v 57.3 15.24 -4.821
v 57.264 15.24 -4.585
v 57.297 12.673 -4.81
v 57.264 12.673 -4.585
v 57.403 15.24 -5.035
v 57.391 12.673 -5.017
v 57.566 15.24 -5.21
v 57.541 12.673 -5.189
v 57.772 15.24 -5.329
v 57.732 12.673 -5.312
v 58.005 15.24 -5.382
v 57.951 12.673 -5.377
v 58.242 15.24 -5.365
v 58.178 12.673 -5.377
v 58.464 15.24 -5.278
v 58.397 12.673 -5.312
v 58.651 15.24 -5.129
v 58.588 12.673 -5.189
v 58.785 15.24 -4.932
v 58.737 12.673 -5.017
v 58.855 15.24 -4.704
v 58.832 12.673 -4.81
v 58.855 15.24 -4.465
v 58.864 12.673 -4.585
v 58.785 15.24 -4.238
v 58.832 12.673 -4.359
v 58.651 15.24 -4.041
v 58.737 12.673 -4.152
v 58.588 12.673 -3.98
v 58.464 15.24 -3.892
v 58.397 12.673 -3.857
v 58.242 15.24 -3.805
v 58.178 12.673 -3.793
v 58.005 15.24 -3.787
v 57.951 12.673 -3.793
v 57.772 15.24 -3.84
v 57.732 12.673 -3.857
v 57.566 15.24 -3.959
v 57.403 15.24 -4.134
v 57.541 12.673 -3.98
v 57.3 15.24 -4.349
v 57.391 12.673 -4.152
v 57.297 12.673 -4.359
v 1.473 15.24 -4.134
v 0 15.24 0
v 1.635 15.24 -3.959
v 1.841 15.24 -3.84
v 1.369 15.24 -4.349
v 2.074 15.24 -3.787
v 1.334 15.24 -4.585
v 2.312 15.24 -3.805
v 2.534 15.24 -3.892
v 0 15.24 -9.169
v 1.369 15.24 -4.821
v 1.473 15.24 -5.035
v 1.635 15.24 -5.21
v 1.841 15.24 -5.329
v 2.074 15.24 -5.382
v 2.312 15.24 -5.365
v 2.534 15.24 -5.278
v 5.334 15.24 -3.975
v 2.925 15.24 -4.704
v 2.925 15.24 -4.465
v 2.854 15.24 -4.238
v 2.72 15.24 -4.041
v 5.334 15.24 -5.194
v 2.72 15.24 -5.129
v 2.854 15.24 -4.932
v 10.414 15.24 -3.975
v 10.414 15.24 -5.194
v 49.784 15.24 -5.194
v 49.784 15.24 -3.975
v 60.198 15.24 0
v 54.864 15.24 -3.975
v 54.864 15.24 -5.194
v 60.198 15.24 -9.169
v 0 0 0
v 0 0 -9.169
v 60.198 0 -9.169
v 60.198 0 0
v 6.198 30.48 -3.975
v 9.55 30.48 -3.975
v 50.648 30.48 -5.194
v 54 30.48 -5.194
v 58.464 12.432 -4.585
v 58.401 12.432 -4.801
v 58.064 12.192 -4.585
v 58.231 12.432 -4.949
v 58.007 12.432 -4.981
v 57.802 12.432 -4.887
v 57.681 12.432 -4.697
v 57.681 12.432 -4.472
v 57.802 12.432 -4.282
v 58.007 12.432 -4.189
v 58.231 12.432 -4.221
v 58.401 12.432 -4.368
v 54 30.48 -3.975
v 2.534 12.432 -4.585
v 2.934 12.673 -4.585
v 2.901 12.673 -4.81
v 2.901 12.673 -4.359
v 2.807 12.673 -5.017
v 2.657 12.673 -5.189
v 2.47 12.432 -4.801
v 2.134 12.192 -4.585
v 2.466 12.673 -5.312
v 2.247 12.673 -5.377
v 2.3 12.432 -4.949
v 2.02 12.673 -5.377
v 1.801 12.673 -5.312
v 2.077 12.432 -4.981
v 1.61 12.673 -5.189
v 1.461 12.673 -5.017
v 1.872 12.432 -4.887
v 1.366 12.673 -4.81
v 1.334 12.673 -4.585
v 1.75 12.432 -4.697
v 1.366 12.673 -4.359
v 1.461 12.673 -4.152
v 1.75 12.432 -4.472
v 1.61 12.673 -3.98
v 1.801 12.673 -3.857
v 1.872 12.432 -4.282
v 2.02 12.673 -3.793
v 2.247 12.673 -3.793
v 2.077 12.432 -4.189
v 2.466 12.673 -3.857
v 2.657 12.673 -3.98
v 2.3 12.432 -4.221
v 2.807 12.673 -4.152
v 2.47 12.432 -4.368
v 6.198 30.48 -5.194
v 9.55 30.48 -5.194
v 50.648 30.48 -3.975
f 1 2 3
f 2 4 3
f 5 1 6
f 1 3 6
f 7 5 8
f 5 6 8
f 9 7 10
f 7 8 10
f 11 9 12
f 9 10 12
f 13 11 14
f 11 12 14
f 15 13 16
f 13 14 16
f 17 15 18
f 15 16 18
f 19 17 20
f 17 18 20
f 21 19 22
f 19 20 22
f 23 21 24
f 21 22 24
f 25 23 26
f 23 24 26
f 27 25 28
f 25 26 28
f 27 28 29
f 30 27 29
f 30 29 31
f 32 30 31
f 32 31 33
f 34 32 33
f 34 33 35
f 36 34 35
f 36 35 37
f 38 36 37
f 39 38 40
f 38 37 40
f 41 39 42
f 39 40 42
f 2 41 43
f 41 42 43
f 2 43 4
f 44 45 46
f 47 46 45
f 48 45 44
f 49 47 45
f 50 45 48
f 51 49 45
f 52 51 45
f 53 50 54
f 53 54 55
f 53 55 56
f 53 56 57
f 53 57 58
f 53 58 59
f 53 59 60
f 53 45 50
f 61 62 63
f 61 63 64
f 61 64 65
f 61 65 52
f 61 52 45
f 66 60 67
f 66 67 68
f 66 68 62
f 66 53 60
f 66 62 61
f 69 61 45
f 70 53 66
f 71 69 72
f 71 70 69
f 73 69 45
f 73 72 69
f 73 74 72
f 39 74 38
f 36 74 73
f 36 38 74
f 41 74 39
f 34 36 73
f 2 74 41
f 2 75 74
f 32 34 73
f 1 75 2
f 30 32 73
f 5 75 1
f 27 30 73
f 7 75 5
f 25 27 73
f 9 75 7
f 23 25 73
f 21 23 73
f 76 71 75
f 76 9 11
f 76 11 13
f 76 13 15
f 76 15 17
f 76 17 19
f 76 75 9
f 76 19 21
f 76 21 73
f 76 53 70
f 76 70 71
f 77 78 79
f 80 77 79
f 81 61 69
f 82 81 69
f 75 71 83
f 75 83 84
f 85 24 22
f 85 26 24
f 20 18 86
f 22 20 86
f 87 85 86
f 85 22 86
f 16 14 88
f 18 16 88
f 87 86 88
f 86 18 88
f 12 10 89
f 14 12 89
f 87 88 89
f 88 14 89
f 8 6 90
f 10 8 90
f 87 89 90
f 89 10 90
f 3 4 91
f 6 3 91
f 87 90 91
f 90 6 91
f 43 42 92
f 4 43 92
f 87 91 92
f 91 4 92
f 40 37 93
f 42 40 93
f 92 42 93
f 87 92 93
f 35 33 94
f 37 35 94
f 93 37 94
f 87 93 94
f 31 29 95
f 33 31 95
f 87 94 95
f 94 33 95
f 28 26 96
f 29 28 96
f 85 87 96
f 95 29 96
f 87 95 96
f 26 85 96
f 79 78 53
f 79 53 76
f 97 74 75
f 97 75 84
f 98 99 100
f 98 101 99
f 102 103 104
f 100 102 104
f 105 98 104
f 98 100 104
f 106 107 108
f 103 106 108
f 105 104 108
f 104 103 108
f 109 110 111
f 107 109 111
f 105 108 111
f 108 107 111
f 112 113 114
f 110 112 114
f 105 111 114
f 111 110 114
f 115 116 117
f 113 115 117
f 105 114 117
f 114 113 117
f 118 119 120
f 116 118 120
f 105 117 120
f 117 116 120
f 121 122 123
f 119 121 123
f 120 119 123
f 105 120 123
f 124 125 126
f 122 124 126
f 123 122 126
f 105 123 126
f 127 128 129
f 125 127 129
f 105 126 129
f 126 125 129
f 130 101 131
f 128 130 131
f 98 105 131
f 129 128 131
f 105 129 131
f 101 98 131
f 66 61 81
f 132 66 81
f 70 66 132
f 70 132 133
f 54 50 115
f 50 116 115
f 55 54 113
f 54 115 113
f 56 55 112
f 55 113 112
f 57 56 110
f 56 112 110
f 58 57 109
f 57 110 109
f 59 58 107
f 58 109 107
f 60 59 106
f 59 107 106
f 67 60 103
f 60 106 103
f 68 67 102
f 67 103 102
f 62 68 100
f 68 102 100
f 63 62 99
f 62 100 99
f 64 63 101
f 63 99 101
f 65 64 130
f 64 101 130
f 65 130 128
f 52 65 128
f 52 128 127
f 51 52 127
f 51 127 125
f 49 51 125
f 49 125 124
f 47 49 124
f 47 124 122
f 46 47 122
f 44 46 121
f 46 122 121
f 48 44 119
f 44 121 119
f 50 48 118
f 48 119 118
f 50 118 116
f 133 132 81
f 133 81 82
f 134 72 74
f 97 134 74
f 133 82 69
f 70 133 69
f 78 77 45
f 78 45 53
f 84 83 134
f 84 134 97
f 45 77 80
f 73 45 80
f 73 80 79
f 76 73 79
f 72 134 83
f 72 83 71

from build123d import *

# Parameters (mm, degrees)
SKETCH1_W                 = 60.198
SKETCH1_H                 = 9.1694
BOSS_EXTRUDE1_DEPTH       = 15.24
SKETCH2_W                 = 5.08
SKETCH2_H                 = 1.2192
BOSS_EXTRUDE2_DEPTH       = 15.24
CUT_EXTRUDE1_REACH        = 69.674
M2X0_4_TAPPED_HOLE1_D     = 1.6
M2X0_4_TAPPED_HOLE1_DEPTH = 2.567311505
M2X0_4_TAPPED_HOLE1_TIP   = 0.480688495


with BuildPart() as part:
    # Sketch1 → Boss-Extrude1 (new body)
    with BuildSketch(Plane(origin=(0, 0, 0), x_dir=(1, 0, 0), z_dir=(0, 1, 0))):
        with Locations((30.099, 4.5847)):
            Rectangle(SKETCH1_W, SKETCH1_H)
    extrude(amount=BOSS_EXTRUDE1_DEPTH)

    # Sketch2 → Boss-Extrude2 (add)
    with BuildSketch(Plane(origin=(0, 15.24, 0), x_dir=(1, 0, 0), z_dir=(0, 1, 0))):
        with Locations((7.874, 4.5847)):
            Rectangle(SKETCH2_W, SKETCH2_H)
        with Locations((52.324, 4.5847)):
            Rectangle(SKETCH2_W, SKETCH2_H)
    extrude(amount=BOSS_EXTRUDE2_DEPTH)

    # Sketch3 → Cut-Extrude1 (cut, up to next)
    with BuildSketch(Plane.XY.offset(-3.9751), mode=Mode.PRIVATE) as cut_extrude1_sk1:
        Polygon((5.334, 15.24), (6.1976, 30.48), (5.334, 30.48), align=None)
    cut_extrude1_tool1 = extrude(cut_extrude1_sk1.sketch, amount=-CUT_EXTRUDE1_REACH, mode=Mode.PRIVATE) & part.part
    # Sketch3 → Cut-Extrude1 (cut, up to next)
    with BuildSketch(Plane.XY.offset(-3.9751), mode=Mode.PRIVATE) as cut_extrude1_sk2:
        Polygon((10.414, 30.48), (9.5504, 30.48), (10.414, 15.24), align=None)
    cut_extrude1_tool2 = extrude(cut_extrude1_sk2.sketch, amount=-CUT_EXTRUDE1_REACH, mode=Mode.PRIVATE) & part.part
    cut_extrude1_1 = cut_extrude1_tool1.solids().sort_by_distance((5.621867, 25.4, -3.9751))[0]
    add(cut_extrude1_1, mode=Mode.SUBTRACT)
    cut_extrude1_2 = cut_extrude1_tool2.solids().sort_by_distance((10.126133, 25.4, -3.9751))[0]
    add(cut_extrude1_2, mode=Mode.SUBTRACT)
    cut_extrude1 = cut_extrude1_1 + cut_extrude1_2  # Cut-Extrude1 as one shape, for the pattern or mirror that repeats it

    # Mirror1: Cut-Extrude1 across plane
    add(cut_extrude1.mirror(Plane(origin=(30.099, 0, 0), x_dir=(0, 0, 1), z_dir=(1, 0, 0))), mode=Mode.SUBTRACT)

    # M2x0.4 Tapped Hole1
    with Locations(Plane(origin=(0, 15.24, 0), x_dir=(1, 0, 0), z_dir=(0, 1, 0))):
        with Locations((2.1336, 4.5847), (58.0644, 4.5847)):
            Hole(M2X0_4_TAPPED_HOLE1_D / 2, depth=M2X0_4_TAPPED_HOLE1_DEPTH)
            with Locations((0, 0, -(M2X0_4_TAPPED_HOLE1_DEPTH + M2X0_4_TAPPED_HOLE1_TIP / 2))):  # 118° drill point
                Cone(0, M2X0_4_TAPPED_HOLE1_D / 2, M2X0_4_TAPPED_HOLE1_TIP, mode=Mode.SUBTRACT)


solid = part.part
